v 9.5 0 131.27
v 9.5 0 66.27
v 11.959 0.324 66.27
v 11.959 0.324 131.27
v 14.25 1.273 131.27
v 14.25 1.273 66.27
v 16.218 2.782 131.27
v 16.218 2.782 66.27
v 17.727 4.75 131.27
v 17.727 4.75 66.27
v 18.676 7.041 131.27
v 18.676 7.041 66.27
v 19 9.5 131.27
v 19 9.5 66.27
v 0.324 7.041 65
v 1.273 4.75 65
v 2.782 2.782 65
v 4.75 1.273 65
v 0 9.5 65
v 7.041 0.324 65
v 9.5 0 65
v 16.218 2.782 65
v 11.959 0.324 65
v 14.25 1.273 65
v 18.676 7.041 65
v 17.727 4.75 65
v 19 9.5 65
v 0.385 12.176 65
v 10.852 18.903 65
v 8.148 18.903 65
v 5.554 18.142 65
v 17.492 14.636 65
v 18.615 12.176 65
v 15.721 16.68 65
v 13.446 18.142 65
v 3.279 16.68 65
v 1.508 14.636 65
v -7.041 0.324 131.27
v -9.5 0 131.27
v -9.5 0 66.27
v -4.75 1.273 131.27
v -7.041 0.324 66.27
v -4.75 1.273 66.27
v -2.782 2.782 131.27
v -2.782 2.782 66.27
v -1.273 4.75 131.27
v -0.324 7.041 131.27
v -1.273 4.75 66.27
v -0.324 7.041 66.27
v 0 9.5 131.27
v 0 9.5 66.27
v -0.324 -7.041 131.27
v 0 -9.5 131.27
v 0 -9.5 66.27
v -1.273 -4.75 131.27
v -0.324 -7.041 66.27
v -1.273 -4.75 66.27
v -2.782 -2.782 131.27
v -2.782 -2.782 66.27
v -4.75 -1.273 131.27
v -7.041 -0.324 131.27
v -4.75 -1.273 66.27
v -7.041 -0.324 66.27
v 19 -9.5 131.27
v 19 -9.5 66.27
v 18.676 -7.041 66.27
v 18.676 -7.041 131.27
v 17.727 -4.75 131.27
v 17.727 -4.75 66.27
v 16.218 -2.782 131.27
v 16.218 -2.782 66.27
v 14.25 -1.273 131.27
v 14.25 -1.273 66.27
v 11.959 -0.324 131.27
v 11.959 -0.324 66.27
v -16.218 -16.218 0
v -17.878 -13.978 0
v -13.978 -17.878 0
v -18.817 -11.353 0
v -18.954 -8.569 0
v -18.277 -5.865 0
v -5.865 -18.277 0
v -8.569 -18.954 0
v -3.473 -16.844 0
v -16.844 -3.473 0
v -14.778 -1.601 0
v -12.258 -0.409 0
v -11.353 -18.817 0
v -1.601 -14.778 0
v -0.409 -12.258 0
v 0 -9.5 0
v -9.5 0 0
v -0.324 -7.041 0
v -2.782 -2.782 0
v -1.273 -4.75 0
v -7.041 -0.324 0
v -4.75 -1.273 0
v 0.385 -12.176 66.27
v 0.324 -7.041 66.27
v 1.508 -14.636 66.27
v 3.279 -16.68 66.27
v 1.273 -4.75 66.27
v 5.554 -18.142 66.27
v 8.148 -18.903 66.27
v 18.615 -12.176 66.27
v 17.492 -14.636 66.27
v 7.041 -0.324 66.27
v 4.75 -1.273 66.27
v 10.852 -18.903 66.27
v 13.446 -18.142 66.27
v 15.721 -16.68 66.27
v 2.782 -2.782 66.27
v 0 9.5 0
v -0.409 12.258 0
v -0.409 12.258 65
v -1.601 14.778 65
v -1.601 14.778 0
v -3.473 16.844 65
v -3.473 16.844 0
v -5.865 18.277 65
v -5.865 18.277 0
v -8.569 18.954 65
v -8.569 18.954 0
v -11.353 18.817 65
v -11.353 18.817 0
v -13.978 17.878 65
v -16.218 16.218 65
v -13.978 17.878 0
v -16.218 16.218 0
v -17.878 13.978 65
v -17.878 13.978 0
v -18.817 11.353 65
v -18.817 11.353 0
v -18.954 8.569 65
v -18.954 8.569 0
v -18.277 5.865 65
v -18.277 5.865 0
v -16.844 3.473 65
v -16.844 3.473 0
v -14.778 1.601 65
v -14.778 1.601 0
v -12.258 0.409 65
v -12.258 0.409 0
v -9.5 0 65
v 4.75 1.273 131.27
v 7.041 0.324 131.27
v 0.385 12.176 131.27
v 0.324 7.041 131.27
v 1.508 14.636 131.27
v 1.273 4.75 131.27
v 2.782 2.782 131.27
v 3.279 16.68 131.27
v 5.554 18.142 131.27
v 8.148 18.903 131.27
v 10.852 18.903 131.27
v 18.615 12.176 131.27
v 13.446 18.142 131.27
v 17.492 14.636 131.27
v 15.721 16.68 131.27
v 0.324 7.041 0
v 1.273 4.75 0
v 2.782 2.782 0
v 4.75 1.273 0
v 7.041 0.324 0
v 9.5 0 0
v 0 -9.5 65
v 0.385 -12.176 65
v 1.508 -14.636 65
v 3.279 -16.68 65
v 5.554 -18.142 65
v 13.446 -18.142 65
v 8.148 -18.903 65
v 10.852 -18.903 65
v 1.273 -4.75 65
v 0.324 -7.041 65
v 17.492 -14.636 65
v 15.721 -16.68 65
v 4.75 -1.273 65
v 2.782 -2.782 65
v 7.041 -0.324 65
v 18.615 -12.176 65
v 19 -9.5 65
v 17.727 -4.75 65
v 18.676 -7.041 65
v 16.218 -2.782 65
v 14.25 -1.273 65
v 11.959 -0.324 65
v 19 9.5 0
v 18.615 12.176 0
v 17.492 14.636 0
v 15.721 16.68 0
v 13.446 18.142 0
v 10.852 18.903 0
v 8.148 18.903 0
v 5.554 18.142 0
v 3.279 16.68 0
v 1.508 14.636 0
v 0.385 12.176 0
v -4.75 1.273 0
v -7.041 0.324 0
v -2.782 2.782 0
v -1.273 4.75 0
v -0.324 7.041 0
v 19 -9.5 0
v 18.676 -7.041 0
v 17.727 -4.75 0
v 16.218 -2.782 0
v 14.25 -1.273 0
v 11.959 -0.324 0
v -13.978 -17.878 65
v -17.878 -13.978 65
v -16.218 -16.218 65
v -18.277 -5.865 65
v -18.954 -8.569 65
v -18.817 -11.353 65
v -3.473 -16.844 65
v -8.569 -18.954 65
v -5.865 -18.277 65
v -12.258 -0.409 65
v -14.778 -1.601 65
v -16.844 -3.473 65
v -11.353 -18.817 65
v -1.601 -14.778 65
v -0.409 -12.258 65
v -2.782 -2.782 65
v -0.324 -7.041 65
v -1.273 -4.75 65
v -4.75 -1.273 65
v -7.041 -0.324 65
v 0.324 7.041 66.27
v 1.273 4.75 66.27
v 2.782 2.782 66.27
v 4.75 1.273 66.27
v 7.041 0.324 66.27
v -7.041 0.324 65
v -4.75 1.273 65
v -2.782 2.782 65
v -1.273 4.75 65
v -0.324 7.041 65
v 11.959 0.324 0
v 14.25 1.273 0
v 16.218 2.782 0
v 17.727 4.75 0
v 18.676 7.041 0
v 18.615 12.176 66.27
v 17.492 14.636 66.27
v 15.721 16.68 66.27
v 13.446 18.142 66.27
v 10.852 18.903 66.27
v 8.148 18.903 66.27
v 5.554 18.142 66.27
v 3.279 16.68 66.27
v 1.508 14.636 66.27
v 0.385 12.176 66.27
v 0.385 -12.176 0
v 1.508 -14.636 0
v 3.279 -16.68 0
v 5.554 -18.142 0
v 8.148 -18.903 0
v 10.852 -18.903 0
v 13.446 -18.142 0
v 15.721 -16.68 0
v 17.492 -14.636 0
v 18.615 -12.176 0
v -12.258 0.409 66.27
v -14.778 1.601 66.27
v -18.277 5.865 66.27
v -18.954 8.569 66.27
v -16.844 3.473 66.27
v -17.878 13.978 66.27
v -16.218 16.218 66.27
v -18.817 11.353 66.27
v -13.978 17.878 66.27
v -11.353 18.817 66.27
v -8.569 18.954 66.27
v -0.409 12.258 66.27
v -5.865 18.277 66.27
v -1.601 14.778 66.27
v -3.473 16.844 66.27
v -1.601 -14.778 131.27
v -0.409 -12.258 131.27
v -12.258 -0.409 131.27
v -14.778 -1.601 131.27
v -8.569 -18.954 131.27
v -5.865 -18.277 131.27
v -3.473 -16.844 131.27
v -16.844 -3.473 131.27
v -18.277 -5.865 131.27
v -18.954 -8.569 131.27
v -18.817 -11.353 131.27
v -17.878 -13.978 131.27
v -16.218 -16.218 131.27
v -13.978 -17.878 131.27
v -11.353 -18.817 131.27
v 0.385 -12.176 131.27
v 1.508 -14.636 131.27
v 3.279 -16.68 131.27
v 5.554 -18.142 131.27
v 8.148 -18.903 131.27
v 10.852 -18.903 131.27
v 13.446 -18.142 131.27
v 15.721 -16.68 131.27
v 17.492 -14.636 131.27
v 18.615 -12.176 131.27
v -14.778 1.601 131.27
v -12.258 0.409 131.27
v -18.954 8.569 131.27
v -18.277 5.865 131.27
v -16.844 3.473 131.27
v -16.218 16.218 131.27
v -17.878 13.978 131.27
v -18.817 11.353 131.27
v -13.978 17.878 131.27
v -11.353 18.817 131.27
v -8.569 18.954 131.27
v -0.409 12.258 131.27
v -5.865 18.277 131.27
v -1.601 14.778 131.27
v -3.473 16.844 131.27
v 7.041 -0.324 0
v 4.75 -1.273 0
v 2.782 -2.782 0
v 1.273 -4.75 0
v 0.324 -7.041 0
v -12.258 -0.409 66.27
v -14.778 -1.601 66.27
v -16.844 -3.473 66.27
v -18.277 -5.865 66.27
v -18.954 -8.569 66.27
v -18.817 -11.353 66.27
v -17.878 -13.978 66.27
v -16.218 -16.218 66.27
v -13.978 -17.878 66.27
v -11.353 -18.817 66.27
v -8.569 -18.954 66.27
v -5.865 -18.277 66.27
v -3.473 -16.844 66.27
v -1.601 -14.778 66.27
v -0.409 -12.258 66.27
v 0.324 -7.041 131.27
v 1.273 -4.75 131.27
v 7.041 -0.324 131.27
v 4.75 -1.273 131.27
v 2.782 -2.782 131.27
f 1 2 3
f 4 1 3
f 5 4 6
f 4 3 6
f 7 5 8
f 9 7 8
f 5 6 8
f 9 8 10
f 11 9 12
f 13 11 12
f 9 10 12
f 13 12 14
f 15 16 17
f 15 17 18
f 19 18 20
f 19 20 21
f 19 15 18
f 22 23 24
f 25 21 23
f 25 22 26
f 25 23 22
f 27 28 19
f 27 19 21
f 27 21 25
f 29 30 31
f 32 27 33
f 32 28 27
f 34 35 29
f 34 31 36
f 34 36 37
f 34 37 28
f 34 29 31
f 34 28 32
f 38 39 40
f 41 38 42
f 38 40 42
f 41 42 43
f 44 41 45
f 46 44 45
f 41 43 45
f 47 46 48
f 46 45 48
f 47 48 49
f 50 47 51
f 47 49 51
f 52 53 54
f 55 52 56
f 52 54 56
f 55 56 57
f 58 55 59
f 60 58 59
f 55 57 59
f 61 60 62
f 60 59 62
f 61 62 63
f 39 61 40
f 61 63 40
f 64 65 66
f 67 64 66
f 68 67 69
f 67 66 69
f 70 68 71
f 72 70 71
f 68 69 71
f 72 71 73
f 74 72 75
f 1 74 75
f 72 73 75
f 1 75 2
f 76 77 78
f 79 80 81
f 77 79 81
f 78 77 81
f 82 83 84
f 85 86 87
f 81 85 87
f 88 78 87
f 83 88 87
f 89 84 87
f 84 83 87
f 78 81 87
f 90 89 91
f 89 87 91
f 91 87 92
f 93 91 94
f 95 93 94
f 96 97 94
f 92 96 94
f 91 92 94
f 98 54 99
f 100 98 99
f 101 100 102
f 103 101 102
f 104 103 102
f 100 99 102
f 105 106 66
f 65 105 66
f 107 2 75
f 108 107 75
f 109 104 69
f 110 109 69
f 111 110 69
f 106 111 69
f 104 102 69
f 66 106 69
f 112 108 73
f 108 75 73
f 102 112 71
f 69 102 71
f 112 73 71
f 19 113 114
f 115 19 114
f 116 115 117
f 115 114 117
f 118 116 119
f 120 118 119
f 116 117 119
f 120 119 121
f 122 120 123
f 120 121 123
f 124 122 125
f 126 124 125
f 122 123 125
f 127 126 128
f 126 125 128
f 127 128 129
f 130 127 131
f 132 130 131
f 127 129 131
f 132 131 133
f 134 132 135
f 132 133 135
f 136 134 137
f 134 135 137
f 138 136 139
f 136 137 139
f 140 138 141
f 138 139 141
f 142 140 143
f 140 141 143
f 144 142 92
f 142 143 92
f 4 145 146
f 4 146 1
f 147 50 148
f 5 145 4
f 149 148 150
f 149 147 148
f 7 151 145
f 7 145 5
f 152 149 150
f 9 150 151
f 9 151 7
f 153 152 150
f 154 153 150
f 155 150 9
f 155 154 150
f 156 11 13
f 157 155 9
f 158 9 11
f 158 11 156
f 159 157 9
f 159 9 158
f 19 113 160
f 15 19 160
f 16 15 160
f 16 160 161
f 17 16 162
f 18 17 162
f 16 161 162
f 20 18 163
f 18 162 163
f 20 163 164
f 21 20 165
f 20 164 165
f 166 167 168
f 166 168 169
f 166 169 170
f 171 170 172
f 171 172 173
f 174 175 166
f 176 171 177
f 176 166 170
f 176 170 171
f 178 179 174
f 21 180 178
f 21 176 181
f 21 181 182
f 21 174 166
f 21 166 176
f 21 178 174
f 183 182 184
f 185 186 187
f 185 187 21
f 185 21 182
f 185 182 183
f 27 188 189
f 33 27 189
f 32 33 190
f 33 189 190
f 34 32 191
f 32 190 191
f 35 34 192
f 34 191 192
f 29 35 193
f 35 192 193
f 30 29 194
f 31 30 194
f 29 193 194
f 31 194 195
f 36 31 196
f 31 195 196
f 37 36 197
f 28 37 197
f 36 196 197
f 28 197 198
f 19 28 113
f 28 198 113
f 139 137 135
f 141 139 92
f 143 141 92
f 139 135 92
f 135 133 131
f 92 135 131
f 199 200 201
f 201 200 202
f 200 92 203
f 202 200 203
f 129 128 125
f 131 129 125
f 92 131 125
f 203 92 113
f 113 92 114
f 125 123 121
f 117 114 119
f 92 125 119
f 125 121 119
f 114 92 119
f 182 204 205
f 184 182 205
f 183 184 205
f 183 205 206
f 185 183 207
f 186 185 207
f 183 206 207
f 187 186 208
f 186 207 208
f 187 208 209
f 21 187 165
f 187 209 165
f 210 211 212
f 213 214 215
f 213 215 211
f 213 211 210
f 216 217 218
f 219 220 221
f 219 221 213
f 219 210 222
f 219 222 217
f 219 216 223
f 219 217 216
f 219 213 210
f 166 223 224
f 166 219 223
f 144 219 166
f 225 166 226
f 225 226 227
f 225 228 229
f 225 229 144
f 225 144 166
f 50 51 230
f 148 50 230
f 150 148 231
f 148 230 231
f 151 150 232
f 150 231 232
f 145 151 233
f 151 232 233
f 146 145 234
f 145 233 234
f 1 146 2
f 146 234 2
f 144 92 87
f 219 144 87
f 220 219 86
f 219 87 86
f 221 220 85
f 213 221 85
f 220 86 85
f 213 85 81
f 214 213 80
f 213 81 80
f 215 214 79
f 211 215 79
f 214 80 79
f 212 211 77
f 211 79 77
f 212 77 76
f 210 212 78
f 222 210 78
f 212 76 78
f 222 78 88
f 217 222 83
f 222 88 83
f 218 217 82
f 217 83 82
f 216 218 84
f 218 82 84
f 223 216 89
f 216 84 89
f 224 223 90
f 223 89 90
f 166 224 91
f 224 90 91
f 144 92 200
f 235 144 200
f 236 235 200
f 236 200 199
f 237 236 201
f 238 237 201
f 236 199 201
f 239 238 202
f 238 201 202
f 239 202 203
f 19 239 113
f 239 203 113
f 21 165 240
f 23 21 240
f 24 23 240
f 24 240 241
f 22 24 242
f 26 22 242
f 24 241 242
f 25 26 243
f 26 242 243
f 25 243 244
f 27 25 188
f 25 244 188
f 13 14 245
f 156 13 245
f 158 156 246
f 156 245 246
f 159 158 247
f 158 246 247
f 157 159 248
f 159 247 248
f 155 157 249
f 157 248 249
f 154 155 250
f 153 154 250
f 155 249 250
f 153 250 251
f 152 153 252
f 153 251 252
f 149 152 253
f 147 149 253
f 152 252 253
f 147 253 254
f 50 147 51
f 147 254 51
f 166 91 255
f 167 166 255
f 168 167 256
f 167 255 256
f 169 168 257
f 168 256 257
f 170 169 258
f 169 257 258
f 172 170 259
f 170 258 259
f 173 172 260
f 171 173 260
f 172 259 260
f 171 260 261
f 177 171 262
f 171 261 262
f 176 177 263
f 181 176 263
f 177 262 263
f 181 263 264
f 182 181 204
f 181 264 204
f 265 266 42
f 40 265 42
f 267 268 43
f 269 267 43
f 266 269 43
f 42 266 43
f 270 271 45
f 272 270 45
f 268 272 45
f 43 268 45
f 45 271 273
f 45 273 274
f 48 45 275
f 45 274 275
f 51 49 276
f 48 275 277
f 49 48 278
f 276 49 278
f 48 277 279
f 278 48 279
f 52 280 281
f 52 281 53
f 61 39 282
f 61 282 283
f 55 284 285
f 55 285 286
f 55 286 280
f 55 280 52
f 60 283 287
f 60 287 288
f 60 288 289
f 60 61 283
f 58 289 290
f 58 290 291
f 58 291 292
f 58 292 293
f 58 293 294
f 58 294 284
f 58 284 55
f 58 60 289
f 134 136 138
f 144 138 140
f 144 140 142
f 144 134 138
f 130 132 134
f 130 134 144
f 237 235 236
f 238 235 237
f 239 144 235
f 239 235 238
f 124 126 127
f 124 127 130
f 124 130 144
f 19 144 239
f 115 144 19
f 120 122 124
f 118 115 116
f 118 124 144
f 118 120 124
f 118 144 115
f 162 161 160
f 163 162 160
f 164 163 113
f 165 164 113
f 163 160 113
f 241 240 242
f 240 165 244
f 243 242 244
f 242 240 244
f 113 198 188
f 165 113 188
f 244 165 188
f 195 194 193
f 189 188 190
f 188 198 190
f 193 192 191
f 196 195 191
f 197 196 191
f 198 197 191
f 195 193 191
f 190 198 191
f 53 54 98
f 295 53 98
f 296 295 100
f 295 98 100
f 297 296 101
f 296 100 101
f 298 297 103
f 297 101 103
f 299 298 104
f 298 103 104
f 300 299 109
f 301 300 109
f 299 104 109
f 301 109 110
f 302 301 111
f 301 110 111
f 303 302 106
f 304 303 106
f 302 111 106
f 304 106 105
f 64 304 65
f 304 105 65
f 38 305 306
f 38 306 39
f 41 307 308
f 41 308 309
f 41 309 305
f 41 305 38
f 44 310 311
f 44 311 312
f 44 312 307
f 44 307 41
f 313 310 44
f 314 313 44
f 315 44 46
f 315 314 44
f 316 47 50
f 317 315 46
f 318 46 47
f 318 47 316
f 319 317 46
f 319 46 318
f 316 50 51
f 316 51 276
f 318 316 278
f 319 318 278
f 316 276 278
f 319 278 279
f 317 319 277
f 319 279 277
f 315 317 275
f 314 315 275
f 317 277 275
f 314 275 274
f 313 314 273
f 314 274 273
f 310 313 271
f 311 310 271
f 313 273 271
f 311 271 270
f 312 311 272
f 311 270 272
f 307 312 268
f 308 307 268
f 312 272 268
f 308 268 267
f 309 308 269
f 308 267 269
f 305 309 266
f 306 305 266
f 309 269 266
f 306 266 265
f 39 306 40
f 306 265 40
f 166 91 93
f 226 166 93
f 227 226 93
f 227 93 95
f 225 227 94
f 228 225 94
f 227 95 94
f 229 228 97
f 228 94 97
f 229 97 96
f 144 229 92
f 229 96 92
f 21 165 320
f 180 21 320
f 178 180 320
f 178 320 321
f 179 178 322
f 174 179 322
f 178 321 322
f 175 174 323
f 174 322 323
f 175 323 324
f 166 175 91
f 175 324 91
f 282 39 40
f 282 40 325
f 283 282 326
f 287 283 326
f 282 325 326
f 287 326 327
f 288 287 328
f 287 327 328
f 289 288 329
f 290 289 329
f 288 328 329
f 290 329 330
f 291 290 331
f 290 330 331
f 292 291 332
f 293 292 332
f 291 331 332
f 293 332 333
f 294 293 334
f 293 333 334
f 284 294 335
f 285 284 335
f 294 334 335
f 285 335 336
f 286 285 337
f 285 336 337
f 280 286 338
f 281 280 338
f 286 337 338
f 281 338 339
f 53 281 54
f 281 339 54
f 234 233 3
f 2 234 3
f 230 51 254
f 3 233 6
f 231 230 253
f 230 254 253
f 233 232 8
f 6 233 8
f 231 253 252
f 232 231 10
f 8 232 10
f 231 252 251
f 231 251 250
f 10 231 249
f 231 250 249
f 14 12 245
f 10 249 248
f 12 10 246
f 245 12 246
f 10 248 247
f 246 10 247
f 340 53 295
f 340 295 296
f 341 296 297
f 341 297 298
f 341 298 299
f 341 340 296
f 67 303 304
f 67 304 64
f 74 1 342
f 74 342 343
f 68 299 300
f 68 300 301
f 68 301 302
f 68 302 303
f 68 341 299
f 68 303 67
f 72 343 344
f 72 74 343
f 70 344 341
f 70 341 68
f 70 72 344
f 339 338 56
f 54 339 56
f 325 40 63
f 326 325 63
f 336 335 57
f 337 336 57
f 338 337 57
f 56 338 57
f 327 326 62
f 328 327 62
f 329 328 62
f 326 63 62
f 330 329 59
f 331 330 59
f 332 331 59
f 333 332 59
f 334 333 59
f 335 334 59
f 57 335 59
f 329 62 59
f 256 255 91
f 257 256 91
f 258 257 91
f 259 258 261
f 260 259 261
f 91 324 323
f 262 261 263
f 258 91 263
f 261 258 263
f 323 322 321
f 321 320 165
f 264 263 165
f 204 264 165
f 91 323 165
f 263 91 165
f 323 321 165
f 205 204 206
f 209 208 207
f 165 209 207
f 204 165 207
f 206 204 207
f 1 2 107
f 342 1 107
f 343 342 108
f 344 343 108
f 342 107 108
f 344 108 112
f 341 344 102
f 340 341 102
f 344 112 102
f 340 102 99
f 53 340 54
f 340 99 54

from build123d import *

# Parameters (mm, degrees)
F1_DEPTH = 65
F4_DEPTH = 65


with BuildPart() as f1:
    # F0 (on Top) → F1 (new body)
    with BuildSketch(Plane.XY):
        with BuildLine():
            ThreePointArc((19, 9.5), (9.5, 19), (0, 9.5))
            ThreePointArc((0, 9.5), (2.7824855787, 2.7824855787), (9.5, 0))
            ThreePointArc((9.5, 0), (16.2175144213, 2.7824855787), (19, 9.5))
        make_face()
    extrude(amount=F1_DEPTH)


with BuildPart() as f1b:
    # F0 (on Top) → F1, piece 2 (new body)
    with BuildSketch(Plane.XY):
        with BuildLine():
            ThreePointArc((19, -9.5), (16.2175144213, -2.7824855787), (9.5, 0))
            ThreePointArc((9.5, 0), (2.7824855787, -2.7824855787), (0, -9.5))
            ThreePointArc((0, -9.5), (9.5, -19), (19, -9.5))
        make_face()
    extrude(amount=F1_DEPTH)


with BuildPart() as f1c:
    # F0 (on Top) → F1, piece 3 (new body)
    with BuildSketch(Plane.XY):
        with BuildLine():
            ThreePointArc((0, -9.5), (-2.7824855787, -2.7824855787), (-9.5, 0))
            ThreePointArc((-9.5, 0), (-16.2175144213, -16.2175144213), (0, -9.5))
        make_face()
    extrude(amount=F1_DEPTH)


with BuildPart() as f1d:
    # F0 (on Top) → F1, piece 4 (new body)
    with BuildSketch(Plane.XY):
        with BuildLine():
            ThreePointArc((-9.5, 0), (-2.7824855787, 2.7824855787), (0, 9.5))
            ThreePointArc((0, 9.5), (-16.2175144213, 16.2175144213), (-9.5, 0))
        make_face()
    extrude(amount=F1_DEPTH)


with BuildPart() as f4:
    # F3 (on offset) → F4 (new body)
    with BuildSketch(Plane.XY.offset(66.27)):
        with BuildLine():
            ThreePointArc((0, 9.5), (2.7824856048, 2.7824855527), (9.5000000736, 0))
            ThreePointArc((9.5000000736, 0), (16.2175144473, 2.7824856048), (19, 9.5))
            ThreePointArc((19, 9.5), (9.5, 19), (0, 9.5))
        make_face()
    extrude(amount=F4_DEPTH)


with BuildPart() as f4b:
    # F3 (on offset) → F4, piece 2 (new body)
    with BuildSketch(Plane.XY.offset(66.27)):
        with BuildLine():
            ThreePointArc((9.5000000736, 0), (2.7824856048, -2.7824855527), (0, -9.5))
            ThreePointArc((0, -9.5), (9.5, -19), (19, -9.5))
            ThreePointArc((19, -9.5), (16.2175144473, -2.7824856048), (9.5000000736, 0))
        make_face()
    extrude(amount=F4_DEPTH)


with BuildPart() as f4c:
    # F3 (on offset) → F4, piece 3 (new body)
    with BuildSketch(Plane.XY.offset(66.27)):
        with BuildLine():
            ThreePointArc((-9.4999999957, 0), (-16.2175144228, -16.2175144197), (0, -9.5))
            ThreePointArc((0, -9.5), (-2.7824855772, -2.7824855803), (-9.4999999957, 0))
        make_face()
    extrude(amount=F4_DEPTH)


with BuildPart() as f4d:
    # F3 (on offset) → F4, piece 4 (new body)
    with BuildSketch(Plane.XY.offset(66.27)):
        with BuildLine():
            ThreePointArc((0, 9.5), (-16.2175144228, 16.2175144197), (-9.4999999957, 0))
            ThreePointArc((-9.4999999957, 0), (-2.7824855772, 2.7824855803), (0, 9.5))
        make_face()
    extrude(amount=F4_DEPTH)


solid = Compound([f1.part, f1b.part, f1c.part, f1d.part, f4.part, f4b.part, f4c.part, f4d.part])
